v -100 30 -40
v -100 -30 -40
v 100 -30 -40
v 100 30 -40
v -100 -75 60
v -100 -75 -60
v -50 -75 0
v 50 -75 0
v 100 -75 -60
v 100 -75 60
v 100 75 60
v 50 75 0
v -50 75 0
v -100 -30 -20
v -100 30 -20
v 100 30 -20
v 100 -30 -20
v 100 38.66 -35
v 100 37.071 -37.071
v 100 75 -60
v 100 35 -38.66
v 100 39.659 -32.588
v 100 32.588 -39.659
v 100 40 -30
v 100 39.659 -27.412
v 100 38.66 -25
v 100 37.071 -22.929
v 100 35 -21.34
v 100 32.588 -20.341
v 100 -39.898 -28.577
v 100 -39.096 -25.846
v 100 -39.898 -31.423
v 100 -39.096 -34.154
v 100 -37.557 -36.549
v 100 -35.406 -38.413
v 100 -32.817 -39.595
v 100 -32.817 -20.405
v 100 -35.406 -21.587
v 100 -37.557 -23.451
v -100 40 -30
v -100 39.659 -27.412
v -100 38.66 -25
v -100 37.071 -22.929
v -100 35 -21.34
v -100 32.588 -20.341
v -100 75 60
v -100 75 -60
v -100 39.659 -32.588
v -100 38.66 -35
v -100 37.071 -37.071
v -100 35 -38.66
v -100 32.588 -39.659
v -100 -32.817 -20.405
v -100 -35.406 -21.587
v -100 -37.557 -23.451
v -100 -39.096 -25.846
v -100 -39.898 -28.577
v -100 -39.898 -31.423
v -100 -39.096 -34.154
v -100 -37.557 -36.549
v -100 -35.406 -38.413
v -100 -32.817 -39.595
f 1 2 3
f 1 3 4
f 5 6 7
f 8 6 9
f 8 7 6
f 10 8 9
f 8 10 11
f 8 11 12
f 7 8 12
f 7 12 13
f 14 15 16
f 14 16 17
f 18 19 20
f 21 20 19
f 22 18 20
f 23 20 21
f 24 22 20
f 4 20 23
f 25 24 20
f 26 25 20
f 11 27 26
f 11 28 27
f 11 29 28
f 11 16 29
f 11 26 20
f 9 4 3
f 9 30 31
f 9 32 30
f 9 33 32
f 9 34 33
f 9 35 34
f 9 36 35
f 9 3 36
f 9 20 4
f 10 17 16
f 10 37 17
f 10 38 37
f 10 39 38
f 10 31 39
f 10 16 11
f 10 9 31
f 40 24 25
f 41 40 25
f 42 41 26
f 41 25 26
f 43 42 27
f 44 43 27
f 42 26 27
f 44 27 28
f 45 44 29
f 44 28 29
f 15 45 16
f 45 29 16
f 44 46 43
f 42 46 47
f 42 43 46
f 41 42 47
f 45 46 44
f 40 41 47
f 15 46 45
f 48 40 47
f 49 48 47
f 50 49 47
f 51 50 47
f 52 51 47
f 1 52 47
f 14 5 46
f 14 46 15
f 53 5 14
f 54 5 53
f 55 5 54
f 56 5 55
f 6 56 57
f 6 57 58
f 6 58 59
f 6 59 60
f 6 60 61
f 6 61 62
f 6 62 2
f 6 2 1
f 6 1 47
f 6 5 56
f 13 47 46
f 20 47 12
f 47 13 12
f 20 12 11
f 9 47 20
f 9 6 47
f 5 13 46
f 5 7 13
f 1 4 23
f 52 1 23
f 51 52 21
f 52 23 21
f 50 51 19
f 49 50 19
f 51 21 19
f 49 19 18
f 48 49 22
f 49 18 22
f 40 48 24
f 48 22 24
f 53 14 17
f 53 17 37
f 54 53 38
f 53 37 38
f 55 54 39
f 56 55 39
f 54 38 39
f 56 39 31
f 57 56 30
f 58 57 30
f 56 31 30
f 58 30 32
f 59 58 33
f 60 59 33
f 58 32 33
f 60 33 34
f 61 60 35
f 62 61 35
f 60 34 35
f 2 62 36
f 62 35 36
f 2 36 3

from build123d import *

# Parameters (mm, degrees)
F1_DEPTH = 75
F3_DEPTH = 200.001


with BuildPart() as f1:
    # F0 (on Front) → F1 (new body, symmetric)
    with BuildSketch(Plane.XZ):
        Polygon((-100, -60), (100, -60), (100, 60), (50, 0), (-50, 0), (-100, 60), align=None)
    extrude(amount=F1_DEPTH, both=True)

    # F2 (on face) → F3 (cut, through all)
    with BuildSketch(Plane.YZ.offset(100)):
        with BuildLine():
            ThreePointArc((30, -40), (20, -30), (30, -20))
            Line((30, -20), (-30, -20))
            ThreePointArc((-30, -20), (-22.9289321881, -22.9289321881), (-20, -30))
            ThreePointArc((-20, -30), (-22.9289321881, -37.0710678119), (-30, -40))
            Line((-30, -40), (30, -40))
        make_face()
        with BuildLine():
            ThreePointArc((40, -30), (37.0710678119, -22.9289321881), (30, -20))
            Line((30, -20), (30, -40))
            ThreePointArc((30, -40), (37.0710678119, -37.0710678119), (40, -30))
        make_face()
        with BuildLine():
            Line((30, -40), (30, -20))
            ThreePointArc((30, -20), (20, -30), (30, -40))
        make_face()
        with BuildLine():
            ThreePointArc((-20, -30), (-22.9289321881, -22.9289321881), (-30, -20))
            Line((-30, -20), (-30, -40))
            ThreePointArc((-30, -40), (-22.9289321881, -37.0710678119), (-20, -30))
        make_face()
        with BuildLine():
            Line((-30, -40), (-30, -20))
            ThreePointArc((-30, -20), (-40, -30), (-30, -40))
        make_face()
    extrude(amount=-F3_DEPTH, mode=Mode.SUBTRACT)


solid = f1.part
